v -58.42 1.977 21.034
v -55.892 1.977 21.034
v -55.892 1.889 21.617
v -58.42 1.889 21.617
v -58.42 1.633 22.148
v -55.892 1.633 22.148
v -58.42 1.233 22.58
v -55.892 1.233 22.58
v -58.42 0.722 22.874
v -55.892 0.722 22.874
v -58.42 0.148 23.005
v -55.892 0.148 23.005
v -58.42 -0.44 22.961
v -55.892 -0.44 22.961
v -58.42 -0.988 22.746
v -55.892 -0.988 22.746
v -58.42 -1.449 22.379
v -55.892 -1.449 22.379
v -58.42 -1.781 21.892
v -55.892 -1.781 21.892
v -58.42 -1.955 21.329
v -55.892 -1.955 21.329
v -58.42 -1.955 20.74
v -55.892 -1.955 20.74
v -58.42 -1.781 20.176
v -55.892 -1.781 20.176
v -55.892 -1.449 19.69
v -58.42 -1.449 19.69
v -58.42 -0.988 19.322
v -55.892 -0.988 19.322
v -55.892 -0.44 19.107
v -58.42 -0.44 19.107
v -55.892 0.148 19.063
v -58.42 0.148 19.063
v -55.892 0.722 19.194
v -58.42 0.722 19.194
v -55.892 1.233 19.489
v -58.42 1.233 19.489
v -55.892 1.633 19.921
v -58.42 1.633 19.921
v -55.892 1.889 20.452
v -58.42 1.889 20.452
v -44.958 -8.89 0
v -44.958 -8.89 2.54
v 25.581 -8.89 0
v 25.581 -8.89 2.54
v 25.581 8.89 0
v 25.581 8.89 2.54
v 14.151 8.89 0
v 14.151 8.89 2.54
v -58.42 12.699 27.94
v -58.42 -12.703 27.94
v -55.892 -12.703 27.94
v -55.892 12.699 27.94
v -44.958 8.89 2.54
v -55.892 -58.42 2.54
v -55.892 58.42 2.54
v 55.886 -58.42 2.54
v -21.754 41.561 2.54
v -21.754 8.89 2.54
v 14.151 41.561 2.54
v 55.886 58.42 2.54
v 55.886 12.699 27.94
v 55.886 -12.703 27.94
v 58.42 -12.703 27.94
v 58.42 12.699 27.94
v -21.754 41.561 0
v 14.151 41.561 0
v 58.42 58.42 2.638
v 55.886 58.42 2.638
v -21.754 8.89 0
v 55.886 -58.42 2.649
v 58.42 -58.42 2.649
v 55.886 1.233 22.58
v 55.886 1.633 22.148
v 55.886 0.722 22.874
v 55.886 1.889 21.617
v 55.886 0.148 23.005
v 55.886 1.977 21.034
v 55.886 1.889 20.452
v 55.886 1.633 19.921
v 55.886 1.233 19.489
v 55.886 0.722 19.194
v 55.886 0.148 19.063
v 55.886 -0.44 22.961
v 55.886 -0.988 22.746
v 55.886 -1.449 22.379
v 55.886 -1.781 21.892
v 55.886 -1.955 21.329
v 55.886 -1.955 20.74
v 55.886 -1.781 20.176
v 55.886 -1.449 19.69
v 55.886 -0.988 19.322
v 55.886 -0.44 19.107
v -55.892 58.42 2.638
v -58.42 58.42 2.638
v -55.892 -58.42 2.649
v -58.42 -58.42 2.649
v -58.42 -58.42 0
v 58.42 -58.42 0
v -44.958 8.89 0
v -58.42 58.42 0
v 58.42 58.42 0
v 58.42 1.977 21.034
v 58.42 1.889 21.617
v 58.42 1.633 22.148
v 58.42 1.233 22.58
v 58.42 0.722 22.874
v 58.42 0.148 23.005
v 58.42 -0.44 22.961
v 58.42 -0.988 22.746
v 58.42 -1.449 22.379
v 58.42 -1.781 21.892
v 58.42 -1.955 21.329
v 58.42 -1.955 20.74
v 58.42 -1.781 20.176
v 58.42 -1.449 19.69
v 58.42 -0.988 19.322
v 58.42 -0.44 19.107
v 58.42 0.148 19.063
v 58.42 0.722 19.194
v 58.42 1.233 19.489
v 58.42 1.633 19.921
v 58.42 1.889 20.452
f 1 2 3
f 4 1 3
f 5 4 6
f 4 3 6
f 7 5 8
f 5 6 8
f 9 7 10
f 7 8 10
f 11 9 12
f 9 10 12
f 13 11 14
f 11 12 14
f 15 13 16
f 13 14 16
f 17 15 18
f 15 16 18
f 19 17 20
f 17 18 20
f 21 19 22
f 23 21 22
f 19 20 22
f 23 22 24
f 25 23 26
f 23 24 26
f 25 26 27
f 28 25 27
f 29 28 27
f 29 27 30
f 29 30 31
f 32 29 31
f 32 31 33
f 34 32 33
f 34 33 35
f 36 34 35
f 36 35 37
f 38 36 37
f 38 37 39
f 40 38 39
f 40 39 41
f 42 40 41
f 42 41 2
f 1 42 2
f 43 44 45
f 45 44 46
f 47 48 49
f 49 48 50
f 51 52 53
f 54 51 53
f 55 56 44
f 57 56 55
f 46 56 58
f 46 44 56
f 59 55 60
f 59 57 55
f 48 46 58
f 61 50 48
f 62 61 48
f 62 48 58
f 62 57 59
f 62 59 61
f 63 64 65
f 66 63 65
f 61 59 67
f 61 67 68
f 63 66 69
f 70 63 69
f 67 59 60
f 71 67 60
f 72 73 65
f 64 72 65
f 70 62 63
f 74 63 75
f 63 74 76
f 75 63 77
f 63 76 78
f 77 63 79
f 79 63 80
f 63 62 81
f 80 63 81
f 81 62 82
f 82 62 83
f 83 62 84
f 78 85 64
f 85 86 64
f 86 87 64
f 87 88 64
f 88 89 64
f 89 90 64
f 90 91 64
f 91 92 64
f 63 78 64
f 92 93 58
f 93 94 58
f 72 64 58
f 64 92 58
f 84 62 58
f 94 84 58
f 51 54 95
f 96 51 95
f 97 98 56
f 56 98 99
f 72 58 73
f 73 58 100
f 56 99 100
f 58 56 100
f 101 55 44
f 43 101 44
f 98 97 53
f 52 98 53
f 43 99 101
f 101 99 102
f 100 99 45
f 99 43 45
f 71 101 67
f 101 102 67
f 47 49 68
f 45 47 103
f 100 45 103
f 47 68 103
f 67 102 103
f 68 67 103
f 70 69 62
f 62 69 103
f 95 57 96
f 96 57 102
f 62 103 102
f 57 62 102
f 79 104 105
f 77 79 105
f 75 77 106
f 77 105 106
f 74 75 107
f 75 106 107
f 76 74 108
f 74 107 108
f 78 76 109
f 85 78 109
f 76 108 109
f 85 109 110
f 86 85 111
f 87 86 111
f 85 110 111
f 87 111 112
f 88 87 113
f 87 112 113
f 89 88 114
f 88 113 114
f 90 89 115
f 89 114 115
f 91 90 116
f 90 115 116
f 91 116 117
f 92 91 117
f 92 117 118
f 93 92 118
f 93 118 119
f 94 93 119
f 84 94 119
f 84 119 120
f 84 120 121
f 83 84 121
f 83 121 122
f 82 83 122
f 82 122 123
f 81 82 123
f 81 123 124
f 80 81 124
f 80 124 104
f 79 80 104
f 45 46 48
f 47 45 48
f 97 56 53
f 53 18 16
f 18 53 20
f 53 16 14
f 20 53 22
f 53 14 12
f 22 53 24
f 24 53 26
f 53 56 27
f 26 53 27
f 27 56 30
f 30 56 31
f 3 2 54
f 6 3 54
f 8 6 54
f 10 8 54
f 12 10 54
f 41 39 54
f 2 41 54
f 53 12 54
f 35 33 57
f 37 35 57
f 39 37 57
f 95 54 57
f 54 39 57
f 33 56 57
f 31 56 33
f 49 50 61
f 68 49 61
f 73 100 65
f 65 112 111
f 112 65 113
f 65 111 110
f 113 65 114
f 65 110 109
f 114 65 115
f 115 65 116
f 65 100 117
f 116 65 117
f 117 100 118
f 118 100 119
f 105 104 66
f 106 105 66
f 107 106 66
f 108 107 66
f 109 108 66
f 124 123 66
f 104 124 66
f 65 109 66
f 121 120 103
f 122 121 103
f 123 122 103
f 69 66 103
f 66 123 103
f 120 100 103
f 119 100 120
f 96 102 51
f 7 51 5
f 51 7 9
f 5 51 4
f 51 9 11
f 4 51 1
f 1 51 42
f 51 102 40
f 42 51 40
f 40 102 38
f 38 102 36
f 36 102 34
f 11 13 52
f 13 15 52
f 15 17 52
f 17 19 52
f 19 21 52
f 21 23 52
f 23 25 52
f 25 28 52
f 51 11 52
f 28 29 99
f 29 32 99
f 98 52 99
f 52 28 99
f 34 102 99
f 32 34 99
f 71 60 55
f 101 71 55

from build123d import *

# Parameters (mm, degrees)
F0_W      = 116.84
F0_H      = 116.840008
F1_DEPTH  = 2.54
F3_DEPTH  = 25.4
F5_DEPTH  = 25.4
F6_R      = 1.976826
F7_DEPTH  = 141.732
F9_DEPTH  = 149.86
F11_DEPTH = 25.4
F10_W     = 23.206993
F10_H     = 32.671138
F12_DEPTH = 25.4


with BuildPart() as f1:
    # F0 (on Top) → F1 (new body)
    with BuildSketch(Plane.XY):
        Rectangle(F0_W, F0_H)
    extrude(amount=F1_DEPTH)

    # F2 (on face) → F3 (join)
    with BuildSketch(Plane.XY.offset(2.54)):
        Polygon((-55.8916, -58.420004), (-55.8916, 0), (-55.8916, 58.420004), (-58.42, 58.420004), (-58.42, -58.420004), align=None)
        Polygon((58.42, 58.420004), (55.886142, 58.420004), (55.886142, 0), (55.886142, -58.420004), (58.42, -58.420004), align=None)
    extrude(amount=F3_DEPTH)

    # F4 (on face) → F5 (cut)
    with BuildSketch(Plane.XY.offset(2.54)):
        Polygon((14.150873, 8.89), (14.150873, 0), (14.150873, -8.89), (25.580873, -8.89), (25.580873, 8.89), align=None)
    extrude(amount=-F5_DEPTH, mode=Mode.SUBTRACT)

    # F6 (on face) → F7 (cut)
    with BuildSketch(Plane.YZ.offset(58.42)):
        with Locations((0, 21.034185)):
            Circle(F6_R)
    extrude(amount=-F7_DEPTH, mode=Mode.SUBTRACT)

    # F8 (on face) → F9 (cut)
    with BuildSketch(Plane.YZ.offset(58.42)):
        Polygon((-58.420004, 2.648506), (-12.702574, 27.94), (-58.420004, 27.94), align=None)
        Polygon((58.420004, 27.94), (12.699459, 27.94), (58.420004, 2.637995), align=None)
    extrude(amount=-F9_DEPTH, mode=Mode.SUBTRACT)

    # F10 (on face) → F11 (cut)
    with BuildSketch(Plane.XY.offset(2.54)):
        Polygon((-44.958197, -8.89), (14.150873, -8.89), (14.150873, 8.89), (-9.05612, 8.89), (-21.754064, 8.89), (-44.958197, 8.89), align=None)
        Polygon((-21.754064, 8.89), (-9.05612, 8.89), (-9.05612, 41.561138), (-15.403662, 41.561138), (-21.754064, 41.561138), align=None)
    extrude(amount=-F11_DEPTH, mode=Mode.SUBTRACT)

    # F10 (on face) → F12 (cut)
    with BuildSketch(Plane.XY.offset(2.54)):
        with Locations((2.547376, 25.225569)):
            Rectangle(F10_W, F10_H)
    extrude(amount=-F12_DEPTH, mode=Mode.SUBTRACT)


solid = f1.part
